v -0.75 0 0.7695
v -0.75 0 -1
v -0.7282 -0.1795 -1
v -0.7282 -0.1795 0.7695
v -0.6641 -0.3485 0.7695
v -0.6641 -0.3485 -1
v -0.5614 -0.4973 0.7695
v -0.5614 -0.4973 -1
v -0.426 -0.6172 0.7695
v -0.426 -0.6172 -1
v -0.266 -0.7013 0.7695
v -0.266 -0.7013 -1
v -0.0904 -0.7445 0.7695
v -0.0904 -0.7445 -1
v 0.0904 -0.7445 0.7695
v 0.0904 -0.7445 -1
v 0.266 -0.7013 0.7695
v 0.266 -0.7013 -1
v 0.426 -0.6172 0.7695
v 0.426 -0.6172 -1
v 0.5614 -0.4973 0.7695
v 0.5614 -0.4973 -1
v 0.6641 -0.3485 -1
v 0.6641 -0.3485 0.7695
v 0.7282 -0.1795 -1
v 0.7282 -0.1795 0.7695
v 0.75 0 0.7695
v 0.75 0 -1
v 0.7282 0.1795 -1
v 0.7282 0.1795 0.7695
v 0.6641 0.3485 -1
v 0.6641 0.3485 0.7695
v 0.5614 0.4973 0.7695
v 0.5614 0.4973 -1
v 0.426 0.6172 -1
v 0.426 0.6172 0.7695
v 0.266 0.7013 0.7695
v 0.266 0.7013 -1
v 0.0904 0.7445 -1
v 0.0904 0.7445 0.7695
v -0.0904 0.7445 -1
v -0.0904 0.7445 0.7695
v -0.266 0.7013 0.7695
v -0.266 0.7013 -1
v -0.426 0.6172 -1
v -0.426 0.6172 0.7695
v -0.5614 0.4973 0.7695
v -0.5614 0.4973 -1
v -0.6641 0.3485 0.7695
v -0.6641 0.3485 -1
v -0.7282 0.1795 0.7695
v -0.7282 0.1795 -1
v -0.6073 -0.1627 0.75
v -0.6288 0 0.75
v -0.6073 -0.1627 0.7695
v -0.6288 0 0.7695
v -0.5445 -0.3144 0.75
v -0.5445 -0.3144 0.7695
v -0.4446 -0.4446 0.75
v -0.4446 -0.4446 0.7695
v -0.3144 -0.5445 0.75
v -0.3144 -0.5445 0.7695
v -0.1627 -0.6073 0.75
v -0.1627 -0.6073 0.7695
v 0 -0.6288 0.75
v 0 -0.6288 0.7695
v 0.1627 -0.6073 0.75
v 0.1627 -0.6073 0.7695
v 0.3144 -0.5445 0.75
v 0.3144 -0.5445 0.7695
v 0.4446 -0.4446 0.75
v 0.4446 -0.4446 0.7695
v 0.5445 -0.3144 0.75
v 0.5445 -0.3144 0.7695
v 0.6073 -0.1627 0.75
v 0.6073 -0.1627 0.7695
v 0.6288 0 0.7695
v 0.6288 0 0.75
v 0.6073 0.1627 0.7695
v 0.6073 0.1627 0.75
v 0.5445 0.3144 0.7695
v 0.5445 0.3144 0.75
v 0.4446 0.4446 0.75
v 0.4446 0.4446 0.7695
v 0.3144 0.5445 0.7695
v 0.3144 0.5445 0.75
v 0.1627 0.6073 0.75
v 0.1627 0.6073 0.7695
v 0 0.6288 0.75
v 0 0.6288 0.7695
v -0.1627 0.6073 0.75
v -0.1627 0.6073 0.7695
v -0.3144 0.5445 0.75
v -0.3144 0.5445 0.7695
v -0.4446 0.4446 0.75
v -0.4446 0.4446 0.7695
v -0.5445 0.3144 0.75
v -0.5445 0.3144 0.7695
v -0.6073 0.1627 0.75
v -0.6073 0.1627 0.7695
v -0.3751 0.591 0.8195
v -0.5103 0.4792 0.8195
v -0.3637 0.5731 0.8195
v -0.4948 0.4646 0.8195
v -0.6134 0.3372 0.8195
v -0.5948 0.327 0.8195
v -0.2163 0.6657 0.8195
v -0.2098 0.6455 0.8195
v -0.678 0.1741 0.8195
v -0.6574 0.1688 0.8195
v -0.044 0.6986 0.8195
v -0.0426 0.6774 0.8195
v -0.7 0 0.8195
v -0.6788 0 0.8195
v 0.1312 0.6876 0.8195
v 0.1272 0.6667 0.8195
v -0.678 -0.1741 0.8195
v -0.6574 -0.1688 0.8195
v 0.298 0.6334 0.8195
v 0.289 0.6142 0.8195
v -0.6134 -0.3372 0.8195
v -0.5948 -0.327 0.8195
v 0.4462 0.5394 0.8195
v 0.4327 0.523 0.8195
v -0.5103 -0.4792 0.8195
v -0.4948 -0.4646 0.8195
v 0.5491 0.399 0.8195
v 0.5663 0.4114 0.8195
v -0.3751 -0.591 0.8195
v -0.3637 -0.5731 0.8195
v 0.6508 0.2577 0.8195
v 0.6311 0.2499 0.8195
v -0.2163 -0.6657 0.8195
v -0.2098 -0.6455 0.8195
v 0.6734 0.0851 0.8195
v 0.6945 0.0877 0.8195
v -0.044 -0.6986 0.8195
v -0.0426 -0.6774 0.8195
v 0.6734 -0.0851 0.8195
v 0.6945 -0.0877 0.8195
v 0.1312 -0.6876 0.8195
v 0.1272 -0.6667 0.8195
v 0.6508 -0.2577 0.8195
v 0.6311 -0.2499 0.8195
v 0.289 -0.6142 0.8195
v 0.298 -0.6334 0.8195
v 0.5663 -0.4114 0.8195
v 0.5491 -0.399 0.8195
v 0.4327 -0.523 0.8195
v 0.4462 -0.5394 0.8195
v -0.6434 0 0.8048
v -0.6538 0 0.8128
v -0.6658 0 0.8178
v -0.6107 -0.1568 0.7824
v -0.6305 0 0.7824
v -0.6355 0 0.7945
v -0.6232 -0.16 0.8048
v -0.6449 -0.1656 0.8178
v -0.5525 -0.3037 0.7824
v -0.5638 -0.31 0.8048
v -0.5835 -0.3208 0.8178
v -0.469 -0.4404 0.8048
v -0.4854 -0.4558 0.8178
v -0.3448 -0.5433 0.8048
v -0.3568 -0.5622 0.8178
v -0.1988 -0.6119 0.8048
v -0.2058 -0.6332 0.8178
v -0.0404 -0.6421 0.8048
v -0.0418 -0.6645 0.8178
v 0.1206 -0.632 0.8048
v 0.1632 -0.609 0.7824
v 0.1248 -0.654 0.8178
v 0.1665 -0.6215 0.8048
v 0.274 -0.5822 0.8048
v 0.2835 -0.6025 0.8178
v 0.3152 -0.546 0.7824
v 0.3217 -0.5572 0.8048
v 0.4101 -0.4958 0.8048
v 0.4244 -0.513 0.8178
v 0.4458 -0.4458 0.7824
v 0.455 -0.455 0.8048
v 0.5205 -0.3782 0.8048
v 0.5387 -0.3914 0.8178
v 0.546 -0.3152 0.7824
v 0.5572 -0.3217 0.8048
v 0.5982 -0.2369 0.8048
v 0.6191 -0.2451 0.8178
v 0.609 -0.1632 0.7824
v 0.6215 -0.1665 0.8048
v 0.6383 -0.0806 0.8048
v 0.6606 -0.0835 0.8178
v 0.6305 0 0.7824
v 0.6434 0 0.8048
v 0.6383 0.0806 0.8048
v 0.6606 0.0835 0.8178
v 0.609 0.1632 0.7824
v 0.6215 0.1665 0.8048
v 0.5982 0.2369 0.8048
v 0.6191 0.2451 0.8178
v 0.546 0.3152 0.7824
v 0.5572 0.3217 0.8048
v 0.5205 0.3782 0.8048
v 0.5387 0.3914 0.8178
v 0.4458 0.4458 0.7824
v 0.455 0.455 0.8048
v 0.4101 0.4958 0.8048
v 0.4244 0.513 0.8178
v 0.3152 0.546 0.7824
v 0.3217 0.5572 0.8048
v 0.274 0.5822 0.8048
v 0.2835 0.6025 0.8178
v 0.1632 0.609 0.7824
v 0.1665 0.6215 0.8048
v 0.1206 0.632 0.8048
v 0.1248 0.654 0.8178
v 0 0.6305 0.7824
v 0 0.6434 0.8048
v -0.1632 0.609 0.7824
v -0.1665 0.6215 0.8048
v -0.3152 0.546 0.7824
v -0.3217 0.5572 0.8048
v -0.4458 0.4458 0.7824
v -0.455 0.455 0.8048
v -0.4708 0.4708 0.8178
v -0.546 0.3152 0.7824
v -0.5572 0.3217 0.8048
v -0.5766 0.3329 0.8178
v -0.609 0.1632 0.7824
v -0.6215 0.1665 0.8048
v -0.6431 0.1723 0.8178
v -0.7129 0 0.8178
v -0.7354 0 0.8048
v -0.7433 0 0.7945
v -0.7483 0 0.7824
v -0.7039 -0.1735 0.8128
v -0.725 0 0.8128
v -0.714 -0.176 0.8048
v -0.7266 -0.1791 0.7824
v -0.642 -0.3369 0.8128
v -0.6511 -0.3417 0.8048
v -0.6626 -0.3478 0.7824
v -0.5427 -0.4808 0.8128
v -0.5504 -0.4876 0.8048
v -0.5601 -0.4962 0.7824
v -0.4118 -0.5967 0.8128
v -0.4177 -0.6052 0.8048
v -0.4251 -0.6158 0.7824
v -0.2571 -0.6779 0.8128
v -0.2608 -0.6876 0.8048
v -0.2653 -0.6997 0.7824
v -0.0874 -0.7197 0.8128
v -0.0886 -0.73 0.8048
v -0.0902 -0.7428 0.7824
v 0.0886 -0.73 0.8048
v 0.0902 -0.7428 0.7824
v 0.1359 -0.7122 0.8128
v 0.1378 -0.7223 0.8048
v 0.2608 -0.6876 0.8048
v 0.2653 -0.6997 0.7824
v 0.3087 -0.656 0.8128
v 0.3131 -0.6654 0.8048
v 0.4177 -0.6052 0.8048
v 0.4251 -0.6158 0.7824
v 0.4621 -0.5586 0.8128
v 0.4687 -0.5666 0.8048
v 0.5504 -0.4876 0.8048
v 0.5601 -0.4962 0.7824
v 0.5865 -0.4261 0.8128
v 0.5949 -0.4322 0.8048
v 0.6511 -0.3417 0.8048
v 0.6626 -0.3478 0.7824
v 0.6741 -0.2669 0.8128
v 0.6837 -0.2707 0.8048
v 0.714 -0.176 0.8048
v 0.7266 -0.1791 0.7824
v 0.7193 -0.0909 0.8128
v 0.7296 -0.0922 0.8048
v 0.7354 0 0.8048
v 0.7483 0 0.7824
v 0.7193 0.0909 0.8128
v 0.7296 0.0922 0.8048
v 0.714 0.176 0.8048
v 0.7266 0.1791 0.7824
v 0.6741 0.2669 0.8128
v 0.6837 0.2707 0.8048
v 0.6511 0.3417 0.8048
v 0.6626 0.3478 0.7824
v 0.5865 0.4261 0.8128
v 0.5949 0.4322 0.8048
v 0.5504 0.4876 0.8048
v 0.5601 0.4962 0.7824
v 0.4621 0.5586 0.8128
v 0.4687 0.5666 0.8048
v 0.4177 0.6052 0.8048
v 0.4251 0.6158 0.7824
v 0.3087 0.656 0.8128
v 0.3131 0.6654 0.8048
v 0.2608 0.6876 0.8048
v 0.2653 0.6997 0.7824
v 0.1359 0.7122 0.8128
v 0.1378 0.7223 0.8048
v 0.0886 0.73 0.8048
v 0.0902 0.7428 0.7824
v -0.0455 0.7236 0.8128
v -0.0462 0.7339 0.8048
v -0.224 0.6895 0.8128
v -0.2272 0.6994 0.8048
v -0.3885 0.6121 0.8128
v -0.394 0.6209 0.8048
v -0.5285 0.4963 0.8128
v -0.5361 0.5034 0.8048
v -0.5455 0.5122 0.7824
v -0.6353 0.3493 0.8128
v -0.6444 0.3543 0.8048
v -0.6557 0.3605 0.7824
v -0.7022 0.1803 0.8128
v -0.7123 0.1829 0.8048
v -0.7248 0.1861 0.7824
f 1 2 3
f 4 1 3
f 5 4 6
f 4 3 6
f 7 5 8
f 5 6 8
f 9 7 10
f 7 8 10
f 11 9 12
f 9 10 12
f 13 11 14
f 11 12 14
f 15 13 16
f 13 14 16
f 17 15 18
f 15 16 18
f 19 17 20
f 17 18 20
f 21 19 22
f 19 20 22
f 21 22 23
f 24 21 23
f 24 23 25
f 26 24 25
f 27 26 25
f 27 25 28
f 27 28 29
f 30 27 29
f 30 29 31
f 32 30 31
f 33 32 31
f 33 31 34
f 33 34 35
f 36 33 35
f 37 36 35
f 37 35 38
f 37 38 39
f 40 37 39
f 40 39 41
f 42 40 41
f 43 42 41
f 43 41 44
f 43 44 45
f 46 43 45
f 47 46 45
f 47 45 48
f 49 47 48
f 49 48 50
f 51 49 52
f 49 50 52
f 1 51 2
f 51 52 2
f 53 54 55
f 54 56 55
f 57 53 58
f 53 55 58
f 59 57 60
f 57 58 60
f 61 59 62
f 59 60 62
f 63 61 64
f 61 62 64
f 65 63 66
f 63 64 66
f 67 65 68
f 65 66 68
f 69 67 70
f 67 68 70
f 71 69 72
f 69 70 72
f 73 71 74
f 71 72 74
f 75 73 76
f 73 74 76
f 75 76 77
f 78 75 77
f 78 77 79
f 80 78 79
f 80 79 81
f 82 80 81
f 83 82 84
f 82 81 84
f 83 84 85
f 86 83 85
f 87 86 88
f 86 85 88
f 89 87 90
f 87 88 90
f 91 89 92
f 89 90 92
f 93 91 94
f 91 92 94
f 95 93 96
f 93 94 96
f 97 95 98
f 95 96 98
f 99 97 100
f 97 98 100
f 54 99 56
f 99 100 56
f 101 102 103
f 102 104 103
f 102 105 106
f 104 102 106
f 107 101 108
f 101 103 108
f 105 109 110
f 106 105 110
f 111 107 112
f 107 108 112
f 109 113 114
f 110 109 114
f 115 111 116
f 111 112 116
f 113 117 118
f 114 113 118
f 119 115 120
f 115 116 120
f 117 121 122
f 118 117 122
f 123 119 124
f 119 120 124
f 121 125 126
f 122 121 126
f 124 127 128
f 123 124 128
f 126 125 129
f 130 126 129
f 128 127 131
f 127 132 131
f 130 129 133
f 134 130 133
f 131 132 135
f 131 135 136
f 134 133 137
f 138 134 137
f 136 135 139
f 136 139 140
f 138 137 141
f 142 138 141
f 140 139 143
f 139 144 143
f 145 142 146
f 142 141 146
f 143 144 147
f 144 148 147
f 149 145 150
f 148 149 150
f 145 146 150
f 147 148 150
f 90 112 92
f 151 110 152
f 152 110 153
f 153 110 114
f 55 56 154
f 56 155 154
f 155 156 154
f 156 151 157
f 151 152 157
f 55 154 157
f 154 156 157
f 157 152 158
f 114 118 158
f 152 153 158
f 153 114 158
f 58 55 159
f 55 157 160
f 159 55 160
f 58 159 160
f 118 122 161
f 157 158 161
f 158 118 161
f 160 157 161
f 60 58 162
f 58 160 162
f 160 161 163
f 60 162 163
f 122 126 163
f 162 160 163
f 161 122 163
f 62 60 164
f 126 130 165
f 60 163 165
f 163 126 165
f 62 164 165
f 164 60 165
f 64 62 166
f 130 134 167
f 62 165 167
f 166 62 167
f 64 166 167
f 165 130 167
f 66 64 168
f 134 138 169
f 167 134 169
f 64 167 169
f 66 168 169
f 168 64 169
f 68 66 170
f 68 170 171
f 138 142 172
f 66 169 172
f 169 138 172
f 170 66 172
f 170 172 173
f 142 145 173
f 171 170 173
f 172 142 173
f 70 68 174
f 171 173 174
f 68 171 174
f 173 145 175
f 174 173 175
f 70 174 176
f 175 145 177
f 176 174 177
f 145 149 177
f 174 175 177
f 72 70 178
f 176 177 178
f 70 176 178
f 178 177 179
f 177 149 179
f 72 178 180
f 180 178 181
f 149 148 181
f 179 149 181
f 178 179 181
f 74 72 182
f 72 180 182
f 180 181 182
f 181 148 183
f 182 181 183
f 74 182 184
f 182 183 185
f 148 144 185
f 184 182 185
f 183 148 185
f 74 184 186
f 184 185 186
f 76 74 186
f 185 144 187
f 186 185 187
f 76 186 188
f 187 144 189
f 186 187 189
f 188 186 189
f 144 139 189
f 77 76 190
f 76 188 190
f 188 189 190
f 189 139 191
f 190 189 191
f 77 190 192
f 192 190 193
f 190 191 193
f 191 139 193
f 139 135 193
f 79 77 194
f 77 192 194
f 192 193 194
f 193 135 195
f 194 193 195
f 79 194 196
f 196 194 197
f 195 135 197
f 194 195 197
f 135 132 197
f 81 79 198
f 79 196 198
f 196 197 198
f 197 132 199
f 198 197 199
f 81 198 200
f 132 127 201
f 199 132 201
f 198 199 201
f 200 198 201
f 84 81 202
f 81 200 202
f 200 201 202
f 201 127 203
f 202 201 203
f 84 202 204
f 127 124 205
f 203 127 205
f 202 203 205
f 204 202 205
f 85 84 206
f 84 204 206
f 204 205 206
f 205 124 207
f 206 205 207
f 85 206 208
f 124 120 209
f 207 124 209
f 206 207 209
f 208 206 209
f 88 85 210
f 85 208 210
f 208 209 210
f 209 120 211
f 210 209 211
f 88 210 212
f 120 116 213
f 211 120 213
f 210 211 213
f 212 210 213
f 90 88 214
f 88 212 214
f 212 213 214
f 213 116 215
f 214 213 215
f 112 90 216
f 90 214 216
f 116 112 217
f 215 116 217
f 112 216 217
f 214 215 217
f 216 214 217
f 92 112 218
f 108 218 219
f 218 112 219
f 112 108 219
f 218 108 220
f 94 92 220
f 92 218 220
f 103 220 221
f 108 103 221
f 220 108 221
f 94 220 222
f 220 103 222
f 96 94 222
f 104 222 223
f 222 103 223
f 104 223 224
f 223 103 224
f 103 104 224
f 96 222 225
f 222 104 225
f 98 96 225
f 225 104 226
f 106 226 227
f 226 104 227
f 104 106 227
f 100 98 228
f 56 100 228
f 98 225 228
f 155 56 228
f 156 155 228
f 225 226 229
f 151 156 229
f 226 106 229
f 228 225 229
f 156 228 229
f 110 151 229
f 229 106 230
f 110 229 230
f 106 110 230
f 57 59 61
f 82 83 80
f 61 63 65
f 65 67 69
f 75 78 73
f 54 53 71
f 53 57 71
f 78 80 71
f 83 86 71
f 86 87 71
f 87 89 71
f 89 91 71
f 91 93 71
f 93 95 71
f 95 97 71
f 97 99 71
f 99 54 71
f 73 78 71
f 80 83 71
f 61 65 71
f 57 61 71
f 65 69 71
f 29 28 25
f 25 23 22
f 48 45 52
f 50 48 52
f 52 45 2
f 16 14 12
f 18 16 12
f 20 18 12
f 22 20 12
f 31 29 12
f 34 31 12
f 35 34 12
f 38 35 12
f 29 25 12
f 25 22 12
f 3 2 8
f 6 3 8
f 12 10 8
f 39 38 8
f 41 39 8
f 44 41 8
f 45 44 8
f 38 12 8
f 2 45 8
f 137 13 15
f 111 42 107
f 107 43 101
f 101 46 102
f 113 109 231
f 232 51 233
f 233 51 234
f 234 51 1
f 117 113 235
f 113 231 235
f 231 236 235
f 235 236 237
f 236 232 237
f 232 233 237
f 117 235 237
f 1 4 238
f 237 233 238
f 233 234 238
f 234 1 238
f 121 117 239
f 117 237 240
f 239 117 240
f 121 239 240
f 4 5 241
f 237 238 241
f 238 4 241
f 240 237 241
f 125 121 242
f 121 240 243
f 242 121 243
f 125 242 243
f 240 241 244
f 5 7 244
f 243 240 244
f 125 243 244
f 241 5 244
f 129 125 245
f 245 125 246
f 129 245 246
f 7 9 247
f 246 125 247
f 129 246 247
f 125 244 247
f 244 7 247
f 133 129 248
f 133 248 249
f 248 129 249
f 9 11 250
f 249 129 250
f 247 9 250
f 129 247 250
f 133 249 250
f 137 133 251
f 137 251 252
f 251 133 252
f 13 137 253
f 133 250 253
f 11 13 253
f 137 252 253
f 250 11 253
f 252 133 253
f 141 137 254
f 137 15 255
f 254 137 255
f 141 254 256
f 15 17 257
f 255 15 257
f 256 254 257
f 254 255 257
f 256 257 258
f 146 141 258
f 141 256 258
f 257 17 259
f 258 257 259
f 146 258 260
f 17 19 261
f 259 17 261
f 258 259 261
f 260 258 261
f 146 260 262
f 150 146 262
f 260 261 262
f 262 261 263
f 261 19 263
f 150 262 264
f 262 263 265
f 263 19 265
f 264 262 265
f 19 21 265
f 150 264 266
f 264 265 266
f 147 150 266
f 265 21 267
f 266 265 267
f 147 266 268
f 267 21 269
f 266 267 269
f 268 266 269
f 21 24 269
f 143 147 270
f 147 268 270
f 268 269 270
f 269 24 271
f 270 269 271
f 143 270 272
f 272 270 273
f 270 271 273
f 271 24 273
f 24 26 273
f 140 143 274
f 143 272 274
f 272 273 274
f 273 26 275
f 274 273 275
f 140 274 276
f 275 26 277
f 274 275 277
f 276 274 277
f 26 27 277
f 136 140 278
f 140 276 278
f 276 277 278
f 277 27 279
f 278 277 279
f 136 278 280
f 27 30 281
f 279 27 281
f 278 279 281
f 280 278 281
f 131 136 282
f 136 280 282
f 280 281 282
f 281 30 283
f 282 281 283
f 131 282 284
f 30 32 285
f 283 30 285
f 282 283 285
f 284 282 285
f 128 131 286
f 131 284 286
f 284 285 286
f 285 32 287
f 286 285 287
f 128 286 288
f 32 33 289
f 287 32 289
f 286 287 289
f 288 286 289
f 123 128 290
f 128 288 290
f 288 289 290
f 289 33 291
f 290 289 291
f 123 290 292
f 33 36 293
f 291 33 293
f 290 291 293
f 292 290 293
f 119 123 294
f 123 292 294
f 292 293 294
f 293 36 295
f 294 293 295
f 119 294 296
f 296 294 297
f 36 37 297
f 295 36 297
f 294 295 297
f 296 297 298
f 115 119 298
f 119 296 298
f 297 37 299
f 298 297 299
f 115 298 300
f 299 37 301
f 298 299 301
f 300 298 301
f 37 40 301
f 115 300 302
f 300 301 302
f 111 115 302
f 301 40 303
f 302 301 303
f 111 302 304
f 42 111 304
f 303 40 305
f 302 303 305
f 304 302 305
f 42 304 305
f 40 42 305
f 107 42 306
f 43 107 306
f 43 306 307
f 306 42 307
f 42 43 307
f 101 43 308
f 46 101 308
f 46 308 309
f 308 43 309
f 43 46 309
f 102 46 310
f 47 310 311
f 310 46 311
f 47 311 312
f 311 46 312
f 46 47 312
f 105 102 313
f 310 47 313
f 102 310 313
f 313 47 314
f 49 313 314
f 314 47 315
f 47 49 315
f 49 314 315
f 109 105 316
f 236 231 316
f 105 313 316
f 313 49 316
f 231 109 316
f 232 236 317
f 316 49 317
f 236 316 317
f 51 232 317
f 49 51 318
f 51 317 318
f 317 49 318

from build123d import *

# Parameters (mm, degrees)
BOSS_EXTRUDE1_START = -1
SKETCH3_R           = 0.75
BOSS_EXTRUDE1_DEPTH = 1


with BuildPart() as part:
    # Sketch2 → Revolve1 (revolve)
    with BuildSketch(Plane(origin=(0, 0, 0), x_dir=(0, 0, -1), z_dir=(1, 0, 0)), mode=Mode.PRIVATE) as revolve1_sk:
        with BuildLine():
            Line((0, 0.75), (0, 0))
            Line((0, 0), (-0.75, 0))
            Line((-0.75, 0), (-0.75, 0.628768743))
            Line((-0.75, 0.628768743), (-0.769458866, 0.628768743))
            ThreePointArc((-0.769458866, 0.628768743), (-0.804814205, 0.643413404), (-0.819458866, 0.678768743))
            Line((-0.819458866, 0.678768743), (-0.819458866, 0.7))
            ThreePointArc((-0.819458866, 0.7), (-0.804814205, 0.735355339), (-0.769458866, 0.75))
            Line((-0.769458866, 0.75), (0, 0.75))
        make_face()
    revolve(revolve1_sk.sketch.rotate(Axis((0, 0, 0), (0, 0, 1)), 90), axis=Axis((0, 0, 0), (0, 0, 1)))

    # Sketch3 → Boss-Extrude1 (add)
    with BuildSketch(Plane.XY.offset(BOSS_EXTRUDE1_START)):
        with Locations(Location((0, 0, 0), (0, 0, 180))):
            Circle(SKETCH3_R)
    extrude(amount=BOSS_EXTRUDE1_DEPTH)


solid = part.part
